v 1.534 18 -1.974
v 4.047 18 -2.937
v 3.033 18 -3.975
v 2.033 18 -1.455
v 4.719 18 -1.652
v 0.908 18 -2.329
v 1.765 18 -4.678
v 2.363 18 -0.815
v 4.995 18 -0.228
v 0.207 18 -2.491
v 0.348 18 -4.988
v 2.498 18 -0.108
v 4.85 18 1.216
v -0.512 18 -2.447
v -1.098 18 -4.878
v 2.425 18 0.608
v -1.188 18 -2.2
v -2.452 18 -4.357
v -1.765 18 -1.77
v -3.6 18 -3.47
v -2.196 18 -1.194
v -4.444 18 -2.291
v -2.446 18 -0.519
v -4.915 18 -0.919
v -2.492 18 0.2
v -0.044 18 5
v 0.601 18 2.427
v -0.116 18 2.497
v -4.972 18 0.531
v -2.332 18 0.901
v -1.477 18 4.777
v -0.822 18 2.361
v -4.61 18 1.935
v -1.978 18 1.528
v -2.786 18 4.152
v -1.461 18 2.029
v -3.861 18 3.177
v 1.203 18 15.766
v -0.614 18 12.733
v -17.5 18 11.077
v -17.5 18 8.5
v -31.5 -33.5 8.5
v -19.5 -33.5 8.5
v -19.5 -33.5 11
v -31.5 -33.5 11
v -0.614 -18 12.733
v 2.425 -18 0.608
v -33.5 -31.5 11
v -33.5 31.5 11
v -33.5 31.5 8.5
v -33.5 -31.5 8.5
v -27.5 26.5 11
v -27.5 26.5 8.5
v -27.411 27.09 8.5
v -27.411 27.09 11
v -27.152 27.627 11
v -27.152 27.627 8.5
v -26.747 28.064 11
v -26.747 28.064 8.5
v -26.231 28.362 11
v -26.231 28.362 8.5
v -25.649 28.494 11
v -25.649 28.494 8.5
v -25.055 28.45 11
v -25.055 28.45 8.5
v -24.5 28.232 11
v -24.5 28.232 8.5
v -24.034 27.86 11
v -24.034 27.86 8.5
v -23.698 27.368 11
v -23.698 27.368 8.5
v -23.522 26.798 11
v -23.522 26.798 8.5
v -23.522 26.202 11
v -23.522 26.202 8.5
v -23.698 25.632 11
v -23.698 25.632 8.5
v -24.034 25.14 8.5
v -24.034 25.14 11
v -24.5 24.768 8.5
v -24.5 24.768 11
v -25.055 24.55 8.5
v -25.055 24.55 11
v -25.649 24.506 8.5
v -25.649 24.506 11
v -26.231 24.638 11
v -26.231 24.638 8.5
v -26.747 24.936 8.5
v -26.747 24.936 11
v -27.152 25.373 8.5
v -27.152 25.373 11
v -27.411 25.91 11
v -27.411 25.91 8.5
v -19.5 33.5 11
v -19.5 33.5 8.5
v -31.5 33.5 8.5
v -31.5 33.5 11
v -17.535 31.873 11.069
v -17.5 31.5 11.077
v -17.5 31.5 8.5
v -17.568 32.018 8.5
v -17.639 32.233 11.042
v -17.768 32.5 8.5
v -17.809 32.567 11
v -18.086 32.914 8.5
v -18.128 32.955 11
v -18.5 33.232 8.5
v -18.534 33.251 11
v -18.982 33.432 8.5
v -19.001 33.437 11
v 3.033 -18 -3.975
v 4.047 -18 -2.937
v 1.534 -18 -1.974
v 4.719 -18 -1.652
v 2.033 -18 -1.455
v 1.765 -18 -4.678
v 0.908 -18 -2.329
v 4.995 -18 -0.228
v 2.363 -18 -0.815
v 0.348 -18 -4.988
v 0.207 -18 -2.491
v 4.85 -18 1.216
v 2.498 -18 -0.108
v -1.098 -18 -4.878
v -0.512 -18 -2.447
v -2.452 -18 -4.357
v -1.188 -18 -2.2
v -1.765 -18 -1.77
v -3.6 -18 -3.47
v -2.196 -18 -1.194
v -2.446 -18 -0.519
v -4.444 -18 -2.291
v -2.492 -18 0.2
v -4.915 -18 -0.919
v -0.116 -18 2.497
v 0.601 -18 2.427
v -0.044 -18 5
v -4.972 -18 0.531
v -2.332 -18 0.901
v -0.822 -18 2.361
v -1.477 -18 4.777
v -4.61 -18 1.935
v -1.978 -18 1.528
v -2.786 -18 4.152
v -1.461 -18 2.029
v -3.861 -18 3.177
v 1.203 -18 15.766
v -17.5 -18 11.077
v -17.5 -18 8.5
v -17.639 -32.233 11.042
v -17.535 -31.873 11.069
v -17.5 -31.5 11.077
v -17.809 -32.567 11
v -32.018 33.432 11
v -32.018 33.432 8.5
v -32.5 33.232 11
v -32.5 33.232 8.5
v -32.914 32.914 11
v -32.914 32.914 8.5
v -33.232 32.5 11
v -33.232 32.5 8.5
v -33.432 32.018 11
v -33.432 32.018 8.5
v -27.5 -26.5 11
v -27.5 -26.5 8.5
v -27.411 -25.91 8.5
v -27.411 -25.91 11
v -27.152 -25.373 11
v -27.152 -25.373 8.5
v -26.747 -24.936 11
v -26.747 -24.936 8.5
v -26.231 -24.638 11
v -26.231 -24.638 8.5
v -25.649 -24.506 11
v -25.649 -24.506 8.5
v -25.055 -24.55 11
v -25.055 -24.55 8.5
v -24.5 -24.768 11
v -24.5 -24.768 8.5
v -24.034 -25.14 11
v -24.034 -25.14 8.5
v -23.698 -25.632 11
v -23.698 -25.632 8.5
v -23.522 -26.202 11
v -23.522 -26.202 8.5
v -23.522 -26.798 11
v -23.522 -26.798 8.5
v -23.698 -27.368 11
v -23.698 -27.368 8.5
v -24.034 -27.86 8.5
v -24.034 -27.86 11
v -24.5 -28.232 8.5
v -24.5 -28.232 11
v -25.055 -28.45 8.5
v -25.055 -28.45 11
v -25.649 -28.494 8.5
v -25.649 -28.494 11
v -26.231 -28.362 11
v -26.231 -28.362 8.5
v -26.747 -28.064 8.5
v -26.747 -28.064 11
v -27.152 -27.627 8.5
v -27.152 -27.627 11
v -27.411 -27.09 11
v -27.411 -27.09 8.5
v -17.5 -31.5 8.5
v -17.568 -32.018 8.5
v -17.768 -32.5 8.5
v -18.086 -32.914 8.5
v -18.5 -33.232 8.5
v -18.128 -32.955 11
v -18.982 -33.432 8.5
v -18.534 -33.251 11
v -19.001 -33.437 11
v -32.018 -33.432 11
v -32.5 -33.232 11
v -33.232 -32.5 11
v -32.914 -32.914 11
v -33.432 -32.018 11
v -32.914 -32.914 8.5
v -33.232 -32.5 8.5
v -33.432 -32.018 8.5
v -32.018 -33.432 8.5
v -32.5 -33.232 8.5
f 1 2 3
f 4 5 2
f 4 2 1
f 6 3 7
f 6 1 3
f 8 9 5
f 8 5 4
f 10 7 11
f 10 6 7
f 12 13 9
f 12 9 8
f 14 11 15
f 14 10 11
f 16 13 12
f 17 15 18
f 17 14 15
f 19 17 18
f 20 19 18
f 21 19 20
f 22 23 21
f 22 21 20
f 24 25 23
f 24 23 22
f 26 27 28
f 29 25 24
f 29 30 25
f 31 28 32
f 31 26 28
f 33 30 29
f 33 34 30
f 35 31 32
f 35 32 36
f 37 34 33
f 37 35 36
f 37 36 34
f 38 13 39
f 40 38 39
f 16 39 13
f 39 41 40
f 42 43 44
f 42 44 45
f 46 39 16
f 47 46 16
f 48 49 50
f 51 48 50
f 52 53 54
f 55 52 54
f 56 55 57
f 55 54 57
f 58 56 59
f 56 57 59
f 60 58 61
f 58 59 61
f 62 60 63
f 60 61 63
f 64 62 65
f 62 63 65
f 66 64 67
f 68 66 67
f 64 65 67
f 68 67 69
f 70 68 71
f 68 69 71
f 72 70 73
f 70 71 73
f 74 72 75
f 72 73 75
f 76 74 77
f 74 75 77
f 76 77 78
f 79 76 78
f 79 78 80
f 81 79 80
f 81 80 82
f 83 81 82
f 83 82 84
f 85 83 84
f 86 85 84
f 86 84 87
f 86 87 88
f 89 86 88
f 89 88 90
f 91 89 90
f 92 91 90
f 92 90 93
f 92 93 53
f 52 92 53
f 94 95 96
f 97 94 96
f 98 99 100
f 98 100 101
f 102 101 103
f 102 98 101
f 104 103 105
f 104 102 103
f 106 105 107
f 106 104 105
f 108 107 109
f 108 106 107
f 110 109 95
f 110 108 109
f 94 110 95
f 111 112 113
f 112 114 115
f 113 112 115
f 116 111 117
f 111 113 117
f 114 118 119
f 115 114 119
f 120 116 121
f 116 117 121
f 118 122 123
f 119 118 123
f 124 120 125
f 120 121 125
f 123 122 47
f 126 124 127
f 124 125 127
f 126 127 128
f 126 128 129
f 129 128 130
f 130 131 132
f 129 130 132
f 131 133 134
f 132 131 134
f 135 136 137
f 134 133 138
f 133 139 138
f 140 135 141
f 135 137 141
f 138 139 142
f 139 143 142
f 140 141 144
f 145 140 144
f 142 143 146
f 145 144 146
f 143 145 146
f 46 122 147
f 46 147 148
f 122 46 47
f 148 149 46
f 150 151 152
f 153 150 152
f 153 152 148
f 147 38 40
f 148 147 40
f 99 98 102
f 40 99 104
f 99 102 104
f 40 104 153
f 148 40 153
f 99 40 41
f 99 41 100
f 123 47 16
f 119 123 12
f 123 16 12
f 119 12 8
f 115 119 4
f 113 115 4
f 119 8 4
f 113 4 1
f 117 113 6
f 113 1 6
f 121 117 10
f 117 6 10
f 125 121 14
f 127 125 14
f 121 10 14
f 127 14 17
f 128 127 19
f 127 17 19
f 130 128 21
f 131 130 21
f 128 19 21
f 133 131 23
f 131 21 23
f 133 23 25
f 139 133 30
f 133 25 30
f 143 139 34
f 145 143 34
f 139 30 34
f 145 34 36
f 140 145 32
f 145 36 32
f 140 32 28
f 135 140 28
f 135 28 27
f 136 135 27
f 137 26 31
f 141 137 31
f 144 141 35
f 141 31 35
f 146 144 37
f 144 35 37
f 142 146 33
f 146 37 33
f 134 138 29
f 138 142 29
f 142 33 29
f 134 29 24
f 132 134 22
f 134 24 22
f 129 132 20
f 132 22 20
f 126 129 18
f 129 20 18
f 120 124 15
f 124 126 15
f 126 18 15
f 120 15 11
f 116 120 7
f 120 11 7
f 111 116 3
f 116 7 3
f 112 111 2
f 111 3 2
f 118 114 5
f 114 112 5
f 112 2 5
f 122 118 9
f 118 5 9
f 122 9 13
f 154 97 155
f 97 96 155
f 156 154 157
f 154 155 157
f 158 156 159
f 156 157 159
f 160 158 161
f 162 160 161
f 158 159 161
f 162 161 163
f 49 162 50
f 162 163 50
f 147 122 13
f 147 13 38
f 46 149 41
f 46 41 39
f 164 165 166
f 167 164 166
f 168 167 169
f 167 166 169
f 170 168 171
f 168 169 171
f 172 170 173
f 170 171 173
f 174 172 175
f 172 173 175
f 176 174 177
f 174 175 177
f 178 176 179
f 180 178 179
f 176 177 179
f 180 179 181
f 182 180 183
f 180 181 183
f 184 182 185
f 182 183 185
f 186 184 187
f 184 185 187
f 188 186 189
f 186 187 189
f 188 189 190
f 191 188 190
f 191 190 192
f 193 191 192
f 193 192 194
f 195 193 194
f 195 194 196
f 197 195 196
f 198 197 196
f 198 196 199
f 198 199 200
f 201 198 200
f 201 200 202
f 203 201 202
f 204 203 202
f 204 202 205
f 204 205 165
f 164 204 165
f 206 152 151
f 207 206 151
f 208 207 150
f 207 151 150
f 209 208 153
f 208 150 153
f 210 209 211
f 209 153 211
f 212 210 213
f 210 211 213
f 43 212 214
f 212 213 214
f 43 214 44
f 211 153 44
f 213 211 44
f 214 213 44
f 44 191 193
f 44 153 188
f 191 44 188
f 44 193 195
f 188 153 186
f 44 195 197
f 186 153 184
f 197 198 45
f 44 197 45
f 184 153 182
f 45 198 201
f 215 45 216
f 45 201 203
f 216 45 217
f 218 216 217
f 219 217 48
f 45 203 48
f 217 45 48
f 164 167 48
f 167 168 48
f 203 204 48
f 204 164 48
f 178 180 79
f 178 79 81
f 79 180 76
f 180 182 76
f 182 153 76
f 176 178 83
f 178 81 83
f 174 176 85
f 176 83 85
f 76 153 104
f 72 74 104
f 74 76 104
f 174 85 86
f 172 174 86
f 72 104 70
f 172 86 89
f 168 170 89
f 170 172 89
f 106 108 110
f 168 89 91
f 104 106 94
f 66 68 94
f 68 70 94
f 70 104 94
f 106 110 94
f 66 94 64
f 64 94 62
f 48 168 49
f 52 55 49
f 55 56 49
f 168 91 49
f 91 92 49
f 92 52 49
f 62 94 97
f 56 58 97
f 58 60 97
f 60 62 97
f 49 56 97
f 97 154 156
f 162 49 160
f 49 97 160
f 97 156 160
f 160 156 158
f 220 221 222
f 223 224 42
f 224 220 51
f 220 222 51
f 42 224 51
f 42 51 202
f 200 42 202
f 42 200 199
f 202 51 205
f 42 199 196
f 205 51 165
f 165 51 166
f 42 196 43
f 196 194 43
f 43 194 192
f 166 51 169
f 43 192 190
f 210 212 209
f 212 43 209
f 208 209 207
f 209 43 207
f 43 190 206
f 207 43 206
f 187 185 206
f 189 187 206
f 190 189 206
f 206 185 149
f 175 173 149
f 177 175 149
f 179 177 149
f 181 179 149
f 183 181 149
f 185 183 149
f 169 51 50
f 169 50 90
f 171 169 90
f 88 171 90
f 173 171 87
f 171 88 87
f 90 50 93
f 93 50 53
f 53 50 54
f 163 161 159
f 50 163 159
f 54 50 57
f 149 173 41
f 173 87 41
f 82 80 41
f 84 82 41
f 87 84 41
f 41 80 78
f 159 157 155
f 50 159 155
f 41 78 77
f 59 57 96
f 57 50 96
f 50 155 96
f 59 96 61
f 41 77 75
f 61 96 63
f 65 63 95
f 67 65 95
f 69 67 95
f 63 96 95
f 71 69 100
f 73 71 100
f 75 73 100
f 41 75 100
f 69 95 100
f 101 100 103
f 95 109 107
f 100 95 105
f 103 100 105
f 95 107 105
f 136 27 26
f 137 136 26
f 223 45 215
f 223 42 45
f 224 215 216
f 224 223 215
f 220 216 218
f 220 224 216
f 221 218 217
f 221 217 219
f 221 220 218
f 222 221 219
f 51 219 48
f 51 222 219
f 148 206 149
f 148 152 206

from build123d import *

# Parameters (mm, degrees)
BOSS_EXTRUDE1_DEPTH     = 33.5
CUT_EXTRUDE1_DEPTH      = 50.262054362
CUT_EXTRUDE1_DEPTH_BACK = 50.262054362
SKETCH3_W               = 37.712944555
SKETCH3_H               = 32.806463902
SKETCH4_R               = 2
CUT_EXTRUDE2_DEPTH      = 50.262054362
FILLET1_R               = 2


with BuildPart() as part:
    # Sketch1 → Boss-Extrude1 (new, symmetric)
    with BuildSketch(Plane(origin=(0, 0, 0), x_dir=(1, 0, 0), z_dir=(0, 1, 0))):
        with BuildLine():
            Line((4.849945859, -1.215740583), (1.202724111, -15.76557816))
            Line((1.202724111, -15.76557816), (-17.808565296, -11))
            Line((-17.808565296, -11), (-33.5, -11))
            Line((-33.5, -11), (-33.5, -8.5))
            Line((-33.5, -8.5), (-17.5, -8.5))
            Line((-17.5, -8.5), (-0.614378527, -12.732734939))
            Line((-0.614378527, -12.732734939), (2.42497293, -0.607870291))
            ThreePointArc((2.42497293, -0.607870291), (-1.76517118, 1.77035892), (0.600751286, -2.426746359))
            Line((0.600751286, -2.426746359), (-0.044239613, -4.999804282))
            ThreePointArc((-0.044239613, -4.999804282), (-3.058347209, 3.95556726), (4.849945859, -1.215740583))
        make_face()
    extrude(amount=BOSS_EXTRUDE1_DEPTH, both=True)

    # Sketch3 → Cut-Extrude1 (cut, two sides: drawn at the far end of the back side and taken through both)
    with BuildSketch(Plane(origin=(0, 0, 8.5), x_dir=(-1, 0, 0), z_dir=(0, 0, -1)).offset(-CUT_EXTRUDE1_DEPTH_BACK)):
        with Locations((-1.356472277, 34.403231951)):
            Rectangle(SKETCH3_W, SKETCH3_H)
        with Locations((-1.356472277, -34.403231951)):
            Rectangle(SKETCH3_W, SKETCH3_H)
    extrude(amount=CUT_EXTRUDE1_DEPTH + CUT_EXTRUDE1_DEPTH_BACK, mode=Mode.SUBTRACT)

    # Sketch4 → Cut-Extrude2 (cut, through all)
    with BuildSketch(Plane(origin=(0, 0, 8.5), x_dir=(-1, 0, 0), z_dir=(0, 0, -1))):
        with Locations((25.5, 26.5)):
            Circle(SKETCH4_R)
        with Locations((25.5, -26.5)):
            Circle(SKETCH4_R)
    extrude(amount=-CUT_EXTRUDE2_DEPTH, mode=Mode.SUBTRACT)

    # Fillet1
    fillet1_edges = [part.edges().sort_by_distance(p)[0] for p in [
        (-17.5, -33.5, 9.788674179),
        (-33.5, -33.5, 9.75),
        (-33.5, 33.5, 9.75),
        (-17.5, 33.5, 9.788674179),
    ]]
    fillet(fillet1_edges, radius=FILLET1_R)


solid = part.part
